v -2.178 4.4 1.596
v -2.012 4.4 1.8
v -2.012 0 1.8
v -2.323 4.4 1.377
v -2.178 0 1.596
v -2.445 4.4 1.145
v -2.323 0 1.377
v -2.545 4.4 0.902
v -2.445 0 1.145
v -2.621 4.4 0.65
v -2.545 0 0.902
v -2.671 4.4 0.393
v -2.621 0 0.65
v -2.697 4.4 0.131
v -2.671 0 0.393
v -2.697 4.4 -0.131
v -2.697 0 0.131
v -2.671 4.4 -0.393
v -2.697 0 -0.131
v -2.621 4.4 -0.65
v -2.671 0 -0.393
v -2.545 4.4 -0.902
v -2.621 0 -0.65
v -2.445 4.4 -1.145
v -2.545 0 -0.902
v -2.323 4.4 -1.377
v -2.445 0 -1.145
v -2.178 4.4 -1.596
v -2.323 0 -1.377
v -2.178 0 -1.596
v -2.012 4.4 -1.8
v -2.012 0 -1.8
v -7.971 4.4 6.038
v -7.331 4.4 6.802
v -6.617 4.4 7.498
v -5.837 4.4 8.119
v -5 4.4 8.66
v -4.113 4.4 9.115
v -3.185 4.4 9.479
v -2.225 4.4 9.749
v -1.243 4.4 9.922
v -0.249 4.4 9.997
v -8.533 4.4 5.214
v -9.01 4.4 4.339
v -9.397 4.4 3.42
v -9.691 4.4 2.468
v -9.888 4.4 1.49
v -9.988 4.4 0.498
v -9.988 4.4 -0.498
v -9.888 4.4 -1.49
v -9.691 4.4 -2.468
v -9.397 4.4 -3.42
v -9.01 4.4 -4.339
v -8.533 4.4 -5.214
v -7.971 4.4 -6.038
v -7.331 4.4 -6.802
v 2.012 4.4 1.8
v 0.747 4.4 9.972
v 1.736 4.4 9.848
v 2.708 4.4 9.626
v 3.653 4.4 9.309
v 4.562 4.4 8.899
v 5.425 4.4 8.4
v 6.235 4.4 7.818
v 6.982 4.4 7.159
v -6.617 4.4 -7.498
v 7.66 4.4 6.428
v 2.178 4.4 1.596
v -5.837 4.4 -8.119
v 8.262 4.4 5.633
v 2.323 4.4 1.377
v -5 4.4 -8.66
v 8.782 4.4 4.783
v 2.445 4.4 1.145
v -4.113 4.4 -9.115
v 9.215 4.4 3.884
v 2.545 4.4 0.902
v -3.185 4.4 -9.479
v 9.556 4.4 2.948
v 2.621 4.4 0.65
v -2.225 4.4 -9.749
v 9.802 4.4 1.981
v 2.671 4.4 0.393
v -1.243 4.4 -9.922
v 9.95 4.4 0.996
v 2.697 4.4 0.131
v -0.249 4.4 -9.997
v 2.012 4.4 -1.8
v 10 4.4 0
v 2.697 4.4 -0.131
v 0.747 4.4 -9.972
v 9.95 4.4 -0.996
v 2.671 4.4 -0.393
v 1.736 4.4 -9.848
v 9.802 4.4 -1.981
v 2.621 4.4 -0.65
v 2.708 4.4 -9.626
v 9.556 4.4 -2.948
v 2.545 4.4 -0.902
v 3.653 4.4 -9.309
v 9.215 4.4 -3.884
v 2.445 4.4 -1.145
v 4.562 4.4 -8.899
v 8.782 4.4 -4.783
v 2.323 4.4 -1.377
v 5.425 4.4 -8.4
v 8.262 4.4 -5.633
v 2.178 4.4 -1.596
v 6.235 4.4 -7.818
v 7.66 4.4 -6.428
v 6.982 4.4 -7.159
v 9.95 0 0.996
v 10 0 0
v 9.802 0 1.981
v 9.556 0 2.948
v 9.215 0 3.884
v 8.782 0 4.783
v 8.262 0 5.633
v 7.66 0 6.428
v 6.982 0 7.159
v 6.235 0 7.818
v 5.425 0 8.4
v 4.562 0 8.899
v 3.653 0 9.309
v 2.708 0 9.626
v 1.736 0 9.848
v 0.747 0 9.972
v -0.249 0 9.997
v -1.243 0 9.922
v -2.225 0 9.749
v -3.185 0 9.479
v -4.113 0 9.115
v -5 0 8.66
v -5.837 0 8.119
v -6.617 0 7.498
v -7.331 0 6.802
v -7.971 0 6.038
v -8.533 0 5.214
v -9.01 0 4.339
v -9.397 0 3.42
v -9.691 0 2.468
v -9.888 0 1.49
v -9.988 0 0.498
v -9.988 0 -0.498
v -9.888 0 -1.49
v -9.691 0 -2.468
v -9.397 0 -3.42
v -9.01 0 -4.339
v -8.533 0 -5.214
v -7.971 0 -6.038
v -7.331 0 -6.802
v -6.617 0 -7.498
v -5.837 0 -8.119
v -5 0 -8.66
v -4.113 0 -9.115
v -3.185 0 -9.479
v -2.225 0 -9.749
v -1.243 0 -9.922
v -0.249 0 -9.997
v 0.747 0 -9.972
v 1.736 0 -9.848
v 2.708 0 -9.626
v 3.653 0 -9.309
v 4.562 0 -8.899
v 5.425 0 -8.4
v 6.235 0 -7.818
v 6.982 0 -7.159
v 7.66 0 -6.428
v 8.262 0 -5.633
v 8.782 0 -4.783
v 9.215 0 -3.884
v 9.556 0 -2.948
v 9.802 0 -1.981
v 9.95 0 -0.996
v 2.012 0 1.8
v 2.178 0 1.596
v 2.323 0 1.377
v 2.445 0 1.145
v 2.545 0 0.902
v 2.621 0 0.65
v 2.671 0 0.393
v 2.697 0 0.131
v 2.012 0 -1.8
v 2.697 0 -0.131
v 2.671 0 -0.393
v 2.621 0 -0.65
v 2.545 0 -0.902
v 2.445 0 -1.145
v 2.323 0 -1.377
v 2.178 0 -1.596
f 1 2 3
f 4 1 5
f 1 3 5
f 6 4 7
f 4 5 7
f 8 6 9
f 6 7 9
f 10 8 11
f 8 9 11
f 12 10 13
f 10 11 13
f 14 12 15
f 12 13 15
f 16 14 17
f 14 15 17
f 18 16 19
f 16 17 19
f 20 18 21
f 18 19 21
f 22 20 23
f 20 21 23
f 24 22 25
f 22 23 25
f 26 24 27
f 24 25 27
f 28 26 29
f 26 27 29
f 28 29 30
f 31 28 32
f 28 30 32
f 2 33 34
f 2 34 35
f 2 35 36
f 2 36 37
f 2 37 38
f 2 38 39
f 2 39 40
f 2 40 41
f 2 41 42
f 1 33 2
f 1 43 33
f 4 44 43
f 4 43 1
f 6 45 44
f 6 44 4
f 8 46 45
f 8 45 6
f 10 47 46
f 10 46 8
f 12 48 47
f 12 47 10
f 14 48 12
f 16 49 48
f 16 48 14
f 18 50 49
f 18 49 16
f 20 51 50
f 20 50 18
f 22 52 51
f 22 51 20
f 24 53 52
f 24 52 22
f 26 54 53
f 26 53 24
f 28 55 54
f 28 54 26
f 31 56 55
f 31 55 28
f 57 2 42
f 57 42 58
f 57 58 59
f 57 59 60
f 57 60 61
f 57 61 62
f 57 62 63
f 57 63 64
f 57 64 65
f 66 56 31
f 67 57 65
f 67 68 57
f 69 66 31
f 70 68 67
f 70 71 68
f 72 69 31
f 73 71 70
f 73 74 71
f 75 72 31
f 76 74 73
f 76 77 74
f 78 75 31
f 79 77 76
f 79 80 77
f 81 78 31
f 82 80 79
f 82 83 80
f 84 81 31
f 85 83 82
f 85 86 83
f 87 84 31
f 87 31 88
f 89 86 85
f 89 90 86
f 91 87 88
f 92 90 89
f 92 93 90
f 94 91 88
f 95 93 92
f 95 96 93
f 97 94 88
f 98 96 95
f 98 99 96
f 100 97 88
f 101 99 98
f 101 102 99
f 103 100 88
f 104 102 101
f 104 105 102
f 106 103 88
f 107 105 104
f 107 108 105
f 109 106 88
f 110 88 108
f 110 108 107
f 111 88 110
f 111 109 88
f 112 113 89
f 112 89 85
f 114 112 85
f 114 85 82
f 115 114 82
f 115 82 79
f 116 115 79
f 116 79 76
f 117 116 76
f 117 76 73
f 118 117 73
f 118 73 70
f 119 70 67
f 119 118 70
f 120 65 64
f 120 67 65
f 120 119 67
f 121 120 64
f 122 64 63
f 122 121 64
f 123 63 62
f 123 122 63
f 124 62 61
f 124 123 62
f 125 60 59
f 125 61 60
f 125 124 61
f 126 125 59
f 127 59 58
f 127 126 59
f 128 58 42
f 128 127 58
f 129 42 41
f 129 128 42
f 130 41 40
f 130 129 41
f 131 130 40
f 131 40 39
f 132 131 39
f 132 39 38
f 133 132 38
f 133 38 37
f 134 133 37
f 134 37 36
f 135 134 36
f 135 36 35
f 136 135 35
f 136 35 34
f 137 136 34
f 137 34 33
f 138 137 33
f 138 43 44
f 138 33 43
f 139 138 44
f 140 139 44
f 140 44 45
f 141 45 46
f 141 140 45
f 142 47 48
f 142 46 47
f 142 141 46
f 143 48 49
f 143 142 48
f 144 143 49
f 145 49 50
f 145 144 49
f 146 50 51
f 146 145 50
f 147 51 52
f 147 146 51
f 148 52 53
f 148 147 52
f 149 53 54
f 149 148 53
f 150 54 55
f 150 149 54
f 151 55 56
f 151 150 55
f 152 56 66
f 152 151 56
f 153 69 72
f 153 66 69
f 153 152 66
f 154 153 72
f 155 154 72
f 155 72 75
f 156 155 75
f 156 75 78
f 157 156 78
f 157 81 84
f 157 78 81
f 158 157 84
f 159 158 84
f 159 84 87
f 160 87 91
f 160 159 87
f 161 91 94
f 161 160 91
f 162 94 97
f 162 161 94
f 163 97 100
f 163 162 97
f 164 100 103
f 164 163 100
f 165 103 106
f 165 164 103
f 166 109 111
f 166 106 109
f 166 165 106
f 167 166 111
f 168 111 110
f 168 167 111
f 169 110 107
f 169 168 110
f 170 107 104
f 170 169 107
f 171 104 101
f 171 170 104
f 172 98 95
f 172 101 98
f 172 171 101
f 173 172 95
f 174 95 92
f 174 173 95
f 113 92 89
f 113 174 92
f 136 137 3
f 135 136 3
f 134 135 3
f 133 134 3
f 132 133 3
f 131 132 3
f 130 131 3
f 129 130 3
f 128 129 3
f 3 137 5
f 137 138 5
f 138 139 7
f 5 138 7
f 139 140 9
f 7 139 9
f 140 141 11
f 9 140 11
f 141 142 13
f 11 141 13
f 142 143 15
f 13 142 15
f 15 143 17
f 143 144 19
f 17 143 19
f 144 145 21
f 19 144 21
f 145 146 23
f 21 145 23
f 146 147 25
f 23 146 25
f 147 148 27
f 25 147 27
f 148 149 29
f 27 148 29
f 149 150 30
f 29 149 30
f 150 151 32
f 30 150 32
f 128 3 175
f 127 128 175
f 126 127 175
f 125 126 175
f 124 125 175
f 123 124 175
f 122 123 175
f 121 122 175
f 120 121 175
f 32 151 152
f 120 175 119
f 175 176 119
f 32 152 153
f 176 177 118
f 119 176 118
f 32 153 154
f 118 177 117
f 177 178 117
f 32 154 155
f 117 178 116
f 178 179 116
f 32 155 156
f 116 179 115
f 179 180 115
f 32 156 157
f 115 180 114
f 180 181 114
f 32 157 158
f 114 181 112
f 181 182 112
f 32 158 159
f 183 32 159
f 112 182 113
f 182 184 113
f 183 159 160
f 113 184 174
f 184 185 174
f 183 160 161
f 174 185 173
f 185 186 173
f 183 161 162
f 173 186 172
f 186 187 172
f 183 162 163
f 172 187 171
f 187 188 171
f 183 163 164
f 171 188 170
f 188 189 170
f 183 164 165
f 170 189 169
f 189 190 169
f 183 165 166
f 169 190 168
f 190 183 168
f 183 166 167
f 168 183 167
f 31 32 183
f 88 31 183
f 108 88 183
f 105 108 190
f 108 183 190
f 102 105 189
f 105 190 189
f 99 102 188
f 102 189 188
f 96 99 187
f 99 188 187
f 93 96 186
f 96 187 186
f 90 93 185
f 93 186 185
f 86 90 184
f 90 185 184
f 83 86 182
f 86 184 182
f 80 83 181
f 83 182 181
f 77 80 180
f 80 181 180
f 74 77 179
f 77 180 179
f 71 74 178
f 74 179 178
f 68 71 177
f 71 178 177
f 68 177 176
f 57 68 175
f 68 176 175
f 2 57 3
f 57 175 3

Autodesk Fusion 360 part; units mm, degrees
sketch "Sketch1" plane through (0, 0, 0) normal (0, 1, 0) x (1, 0, 0)
  circle A0 centre (0, 0) radius 10
  circle A1 centre (0, 0) radius 2.7
  line L0 (2.7, -1.8) -> (-2.7, -1.8)
  line L1 (-2.7, -1.8) -> (-2.7, 1.8)
  line L2 (-2.7, 1.8) -> (2.7, 1.8)
  line L3 (2.7, 1.8) -> (2.7, -1.8)
  line L4 (2.7, -1.8) -> (-2.7, 1.8) construction
  line L5 (-2.7, -1.8) -> (2.7, 1.8) construction
  dimension "d1" = 20
  dimension "d2" = 5.4
  dimension "d3" = 5.4
  dimension "d4" = 3.6
extrude "Extrude1" add sketch "Sketch1" along normal blind 4.4 contours A0 | A1 L0 L3 | A1 L2 L3 | A1 L2 | A1 L0 | A1 L1 L2 | A1 L0 L1
sketch "Sketch4" plane through (0, 0, 0) normal (0, 1, 0) x (1, 0, 0)
  arc A0 (2.0125, -1.8) -> (2.0125, 1.8) centre (0, 0) ccw
  line L0 (2.0125, 1.8) -> (-2.0125, 1.8)
  arc A1 (-2.0125, 1.8) -> (-2.0125, -1.8) centre (0, 0) ccw
  line L1 (-2.0125, -1.8) -> (2.0125, -1.8)
  circle A2 centre (0, 0) radius 10
